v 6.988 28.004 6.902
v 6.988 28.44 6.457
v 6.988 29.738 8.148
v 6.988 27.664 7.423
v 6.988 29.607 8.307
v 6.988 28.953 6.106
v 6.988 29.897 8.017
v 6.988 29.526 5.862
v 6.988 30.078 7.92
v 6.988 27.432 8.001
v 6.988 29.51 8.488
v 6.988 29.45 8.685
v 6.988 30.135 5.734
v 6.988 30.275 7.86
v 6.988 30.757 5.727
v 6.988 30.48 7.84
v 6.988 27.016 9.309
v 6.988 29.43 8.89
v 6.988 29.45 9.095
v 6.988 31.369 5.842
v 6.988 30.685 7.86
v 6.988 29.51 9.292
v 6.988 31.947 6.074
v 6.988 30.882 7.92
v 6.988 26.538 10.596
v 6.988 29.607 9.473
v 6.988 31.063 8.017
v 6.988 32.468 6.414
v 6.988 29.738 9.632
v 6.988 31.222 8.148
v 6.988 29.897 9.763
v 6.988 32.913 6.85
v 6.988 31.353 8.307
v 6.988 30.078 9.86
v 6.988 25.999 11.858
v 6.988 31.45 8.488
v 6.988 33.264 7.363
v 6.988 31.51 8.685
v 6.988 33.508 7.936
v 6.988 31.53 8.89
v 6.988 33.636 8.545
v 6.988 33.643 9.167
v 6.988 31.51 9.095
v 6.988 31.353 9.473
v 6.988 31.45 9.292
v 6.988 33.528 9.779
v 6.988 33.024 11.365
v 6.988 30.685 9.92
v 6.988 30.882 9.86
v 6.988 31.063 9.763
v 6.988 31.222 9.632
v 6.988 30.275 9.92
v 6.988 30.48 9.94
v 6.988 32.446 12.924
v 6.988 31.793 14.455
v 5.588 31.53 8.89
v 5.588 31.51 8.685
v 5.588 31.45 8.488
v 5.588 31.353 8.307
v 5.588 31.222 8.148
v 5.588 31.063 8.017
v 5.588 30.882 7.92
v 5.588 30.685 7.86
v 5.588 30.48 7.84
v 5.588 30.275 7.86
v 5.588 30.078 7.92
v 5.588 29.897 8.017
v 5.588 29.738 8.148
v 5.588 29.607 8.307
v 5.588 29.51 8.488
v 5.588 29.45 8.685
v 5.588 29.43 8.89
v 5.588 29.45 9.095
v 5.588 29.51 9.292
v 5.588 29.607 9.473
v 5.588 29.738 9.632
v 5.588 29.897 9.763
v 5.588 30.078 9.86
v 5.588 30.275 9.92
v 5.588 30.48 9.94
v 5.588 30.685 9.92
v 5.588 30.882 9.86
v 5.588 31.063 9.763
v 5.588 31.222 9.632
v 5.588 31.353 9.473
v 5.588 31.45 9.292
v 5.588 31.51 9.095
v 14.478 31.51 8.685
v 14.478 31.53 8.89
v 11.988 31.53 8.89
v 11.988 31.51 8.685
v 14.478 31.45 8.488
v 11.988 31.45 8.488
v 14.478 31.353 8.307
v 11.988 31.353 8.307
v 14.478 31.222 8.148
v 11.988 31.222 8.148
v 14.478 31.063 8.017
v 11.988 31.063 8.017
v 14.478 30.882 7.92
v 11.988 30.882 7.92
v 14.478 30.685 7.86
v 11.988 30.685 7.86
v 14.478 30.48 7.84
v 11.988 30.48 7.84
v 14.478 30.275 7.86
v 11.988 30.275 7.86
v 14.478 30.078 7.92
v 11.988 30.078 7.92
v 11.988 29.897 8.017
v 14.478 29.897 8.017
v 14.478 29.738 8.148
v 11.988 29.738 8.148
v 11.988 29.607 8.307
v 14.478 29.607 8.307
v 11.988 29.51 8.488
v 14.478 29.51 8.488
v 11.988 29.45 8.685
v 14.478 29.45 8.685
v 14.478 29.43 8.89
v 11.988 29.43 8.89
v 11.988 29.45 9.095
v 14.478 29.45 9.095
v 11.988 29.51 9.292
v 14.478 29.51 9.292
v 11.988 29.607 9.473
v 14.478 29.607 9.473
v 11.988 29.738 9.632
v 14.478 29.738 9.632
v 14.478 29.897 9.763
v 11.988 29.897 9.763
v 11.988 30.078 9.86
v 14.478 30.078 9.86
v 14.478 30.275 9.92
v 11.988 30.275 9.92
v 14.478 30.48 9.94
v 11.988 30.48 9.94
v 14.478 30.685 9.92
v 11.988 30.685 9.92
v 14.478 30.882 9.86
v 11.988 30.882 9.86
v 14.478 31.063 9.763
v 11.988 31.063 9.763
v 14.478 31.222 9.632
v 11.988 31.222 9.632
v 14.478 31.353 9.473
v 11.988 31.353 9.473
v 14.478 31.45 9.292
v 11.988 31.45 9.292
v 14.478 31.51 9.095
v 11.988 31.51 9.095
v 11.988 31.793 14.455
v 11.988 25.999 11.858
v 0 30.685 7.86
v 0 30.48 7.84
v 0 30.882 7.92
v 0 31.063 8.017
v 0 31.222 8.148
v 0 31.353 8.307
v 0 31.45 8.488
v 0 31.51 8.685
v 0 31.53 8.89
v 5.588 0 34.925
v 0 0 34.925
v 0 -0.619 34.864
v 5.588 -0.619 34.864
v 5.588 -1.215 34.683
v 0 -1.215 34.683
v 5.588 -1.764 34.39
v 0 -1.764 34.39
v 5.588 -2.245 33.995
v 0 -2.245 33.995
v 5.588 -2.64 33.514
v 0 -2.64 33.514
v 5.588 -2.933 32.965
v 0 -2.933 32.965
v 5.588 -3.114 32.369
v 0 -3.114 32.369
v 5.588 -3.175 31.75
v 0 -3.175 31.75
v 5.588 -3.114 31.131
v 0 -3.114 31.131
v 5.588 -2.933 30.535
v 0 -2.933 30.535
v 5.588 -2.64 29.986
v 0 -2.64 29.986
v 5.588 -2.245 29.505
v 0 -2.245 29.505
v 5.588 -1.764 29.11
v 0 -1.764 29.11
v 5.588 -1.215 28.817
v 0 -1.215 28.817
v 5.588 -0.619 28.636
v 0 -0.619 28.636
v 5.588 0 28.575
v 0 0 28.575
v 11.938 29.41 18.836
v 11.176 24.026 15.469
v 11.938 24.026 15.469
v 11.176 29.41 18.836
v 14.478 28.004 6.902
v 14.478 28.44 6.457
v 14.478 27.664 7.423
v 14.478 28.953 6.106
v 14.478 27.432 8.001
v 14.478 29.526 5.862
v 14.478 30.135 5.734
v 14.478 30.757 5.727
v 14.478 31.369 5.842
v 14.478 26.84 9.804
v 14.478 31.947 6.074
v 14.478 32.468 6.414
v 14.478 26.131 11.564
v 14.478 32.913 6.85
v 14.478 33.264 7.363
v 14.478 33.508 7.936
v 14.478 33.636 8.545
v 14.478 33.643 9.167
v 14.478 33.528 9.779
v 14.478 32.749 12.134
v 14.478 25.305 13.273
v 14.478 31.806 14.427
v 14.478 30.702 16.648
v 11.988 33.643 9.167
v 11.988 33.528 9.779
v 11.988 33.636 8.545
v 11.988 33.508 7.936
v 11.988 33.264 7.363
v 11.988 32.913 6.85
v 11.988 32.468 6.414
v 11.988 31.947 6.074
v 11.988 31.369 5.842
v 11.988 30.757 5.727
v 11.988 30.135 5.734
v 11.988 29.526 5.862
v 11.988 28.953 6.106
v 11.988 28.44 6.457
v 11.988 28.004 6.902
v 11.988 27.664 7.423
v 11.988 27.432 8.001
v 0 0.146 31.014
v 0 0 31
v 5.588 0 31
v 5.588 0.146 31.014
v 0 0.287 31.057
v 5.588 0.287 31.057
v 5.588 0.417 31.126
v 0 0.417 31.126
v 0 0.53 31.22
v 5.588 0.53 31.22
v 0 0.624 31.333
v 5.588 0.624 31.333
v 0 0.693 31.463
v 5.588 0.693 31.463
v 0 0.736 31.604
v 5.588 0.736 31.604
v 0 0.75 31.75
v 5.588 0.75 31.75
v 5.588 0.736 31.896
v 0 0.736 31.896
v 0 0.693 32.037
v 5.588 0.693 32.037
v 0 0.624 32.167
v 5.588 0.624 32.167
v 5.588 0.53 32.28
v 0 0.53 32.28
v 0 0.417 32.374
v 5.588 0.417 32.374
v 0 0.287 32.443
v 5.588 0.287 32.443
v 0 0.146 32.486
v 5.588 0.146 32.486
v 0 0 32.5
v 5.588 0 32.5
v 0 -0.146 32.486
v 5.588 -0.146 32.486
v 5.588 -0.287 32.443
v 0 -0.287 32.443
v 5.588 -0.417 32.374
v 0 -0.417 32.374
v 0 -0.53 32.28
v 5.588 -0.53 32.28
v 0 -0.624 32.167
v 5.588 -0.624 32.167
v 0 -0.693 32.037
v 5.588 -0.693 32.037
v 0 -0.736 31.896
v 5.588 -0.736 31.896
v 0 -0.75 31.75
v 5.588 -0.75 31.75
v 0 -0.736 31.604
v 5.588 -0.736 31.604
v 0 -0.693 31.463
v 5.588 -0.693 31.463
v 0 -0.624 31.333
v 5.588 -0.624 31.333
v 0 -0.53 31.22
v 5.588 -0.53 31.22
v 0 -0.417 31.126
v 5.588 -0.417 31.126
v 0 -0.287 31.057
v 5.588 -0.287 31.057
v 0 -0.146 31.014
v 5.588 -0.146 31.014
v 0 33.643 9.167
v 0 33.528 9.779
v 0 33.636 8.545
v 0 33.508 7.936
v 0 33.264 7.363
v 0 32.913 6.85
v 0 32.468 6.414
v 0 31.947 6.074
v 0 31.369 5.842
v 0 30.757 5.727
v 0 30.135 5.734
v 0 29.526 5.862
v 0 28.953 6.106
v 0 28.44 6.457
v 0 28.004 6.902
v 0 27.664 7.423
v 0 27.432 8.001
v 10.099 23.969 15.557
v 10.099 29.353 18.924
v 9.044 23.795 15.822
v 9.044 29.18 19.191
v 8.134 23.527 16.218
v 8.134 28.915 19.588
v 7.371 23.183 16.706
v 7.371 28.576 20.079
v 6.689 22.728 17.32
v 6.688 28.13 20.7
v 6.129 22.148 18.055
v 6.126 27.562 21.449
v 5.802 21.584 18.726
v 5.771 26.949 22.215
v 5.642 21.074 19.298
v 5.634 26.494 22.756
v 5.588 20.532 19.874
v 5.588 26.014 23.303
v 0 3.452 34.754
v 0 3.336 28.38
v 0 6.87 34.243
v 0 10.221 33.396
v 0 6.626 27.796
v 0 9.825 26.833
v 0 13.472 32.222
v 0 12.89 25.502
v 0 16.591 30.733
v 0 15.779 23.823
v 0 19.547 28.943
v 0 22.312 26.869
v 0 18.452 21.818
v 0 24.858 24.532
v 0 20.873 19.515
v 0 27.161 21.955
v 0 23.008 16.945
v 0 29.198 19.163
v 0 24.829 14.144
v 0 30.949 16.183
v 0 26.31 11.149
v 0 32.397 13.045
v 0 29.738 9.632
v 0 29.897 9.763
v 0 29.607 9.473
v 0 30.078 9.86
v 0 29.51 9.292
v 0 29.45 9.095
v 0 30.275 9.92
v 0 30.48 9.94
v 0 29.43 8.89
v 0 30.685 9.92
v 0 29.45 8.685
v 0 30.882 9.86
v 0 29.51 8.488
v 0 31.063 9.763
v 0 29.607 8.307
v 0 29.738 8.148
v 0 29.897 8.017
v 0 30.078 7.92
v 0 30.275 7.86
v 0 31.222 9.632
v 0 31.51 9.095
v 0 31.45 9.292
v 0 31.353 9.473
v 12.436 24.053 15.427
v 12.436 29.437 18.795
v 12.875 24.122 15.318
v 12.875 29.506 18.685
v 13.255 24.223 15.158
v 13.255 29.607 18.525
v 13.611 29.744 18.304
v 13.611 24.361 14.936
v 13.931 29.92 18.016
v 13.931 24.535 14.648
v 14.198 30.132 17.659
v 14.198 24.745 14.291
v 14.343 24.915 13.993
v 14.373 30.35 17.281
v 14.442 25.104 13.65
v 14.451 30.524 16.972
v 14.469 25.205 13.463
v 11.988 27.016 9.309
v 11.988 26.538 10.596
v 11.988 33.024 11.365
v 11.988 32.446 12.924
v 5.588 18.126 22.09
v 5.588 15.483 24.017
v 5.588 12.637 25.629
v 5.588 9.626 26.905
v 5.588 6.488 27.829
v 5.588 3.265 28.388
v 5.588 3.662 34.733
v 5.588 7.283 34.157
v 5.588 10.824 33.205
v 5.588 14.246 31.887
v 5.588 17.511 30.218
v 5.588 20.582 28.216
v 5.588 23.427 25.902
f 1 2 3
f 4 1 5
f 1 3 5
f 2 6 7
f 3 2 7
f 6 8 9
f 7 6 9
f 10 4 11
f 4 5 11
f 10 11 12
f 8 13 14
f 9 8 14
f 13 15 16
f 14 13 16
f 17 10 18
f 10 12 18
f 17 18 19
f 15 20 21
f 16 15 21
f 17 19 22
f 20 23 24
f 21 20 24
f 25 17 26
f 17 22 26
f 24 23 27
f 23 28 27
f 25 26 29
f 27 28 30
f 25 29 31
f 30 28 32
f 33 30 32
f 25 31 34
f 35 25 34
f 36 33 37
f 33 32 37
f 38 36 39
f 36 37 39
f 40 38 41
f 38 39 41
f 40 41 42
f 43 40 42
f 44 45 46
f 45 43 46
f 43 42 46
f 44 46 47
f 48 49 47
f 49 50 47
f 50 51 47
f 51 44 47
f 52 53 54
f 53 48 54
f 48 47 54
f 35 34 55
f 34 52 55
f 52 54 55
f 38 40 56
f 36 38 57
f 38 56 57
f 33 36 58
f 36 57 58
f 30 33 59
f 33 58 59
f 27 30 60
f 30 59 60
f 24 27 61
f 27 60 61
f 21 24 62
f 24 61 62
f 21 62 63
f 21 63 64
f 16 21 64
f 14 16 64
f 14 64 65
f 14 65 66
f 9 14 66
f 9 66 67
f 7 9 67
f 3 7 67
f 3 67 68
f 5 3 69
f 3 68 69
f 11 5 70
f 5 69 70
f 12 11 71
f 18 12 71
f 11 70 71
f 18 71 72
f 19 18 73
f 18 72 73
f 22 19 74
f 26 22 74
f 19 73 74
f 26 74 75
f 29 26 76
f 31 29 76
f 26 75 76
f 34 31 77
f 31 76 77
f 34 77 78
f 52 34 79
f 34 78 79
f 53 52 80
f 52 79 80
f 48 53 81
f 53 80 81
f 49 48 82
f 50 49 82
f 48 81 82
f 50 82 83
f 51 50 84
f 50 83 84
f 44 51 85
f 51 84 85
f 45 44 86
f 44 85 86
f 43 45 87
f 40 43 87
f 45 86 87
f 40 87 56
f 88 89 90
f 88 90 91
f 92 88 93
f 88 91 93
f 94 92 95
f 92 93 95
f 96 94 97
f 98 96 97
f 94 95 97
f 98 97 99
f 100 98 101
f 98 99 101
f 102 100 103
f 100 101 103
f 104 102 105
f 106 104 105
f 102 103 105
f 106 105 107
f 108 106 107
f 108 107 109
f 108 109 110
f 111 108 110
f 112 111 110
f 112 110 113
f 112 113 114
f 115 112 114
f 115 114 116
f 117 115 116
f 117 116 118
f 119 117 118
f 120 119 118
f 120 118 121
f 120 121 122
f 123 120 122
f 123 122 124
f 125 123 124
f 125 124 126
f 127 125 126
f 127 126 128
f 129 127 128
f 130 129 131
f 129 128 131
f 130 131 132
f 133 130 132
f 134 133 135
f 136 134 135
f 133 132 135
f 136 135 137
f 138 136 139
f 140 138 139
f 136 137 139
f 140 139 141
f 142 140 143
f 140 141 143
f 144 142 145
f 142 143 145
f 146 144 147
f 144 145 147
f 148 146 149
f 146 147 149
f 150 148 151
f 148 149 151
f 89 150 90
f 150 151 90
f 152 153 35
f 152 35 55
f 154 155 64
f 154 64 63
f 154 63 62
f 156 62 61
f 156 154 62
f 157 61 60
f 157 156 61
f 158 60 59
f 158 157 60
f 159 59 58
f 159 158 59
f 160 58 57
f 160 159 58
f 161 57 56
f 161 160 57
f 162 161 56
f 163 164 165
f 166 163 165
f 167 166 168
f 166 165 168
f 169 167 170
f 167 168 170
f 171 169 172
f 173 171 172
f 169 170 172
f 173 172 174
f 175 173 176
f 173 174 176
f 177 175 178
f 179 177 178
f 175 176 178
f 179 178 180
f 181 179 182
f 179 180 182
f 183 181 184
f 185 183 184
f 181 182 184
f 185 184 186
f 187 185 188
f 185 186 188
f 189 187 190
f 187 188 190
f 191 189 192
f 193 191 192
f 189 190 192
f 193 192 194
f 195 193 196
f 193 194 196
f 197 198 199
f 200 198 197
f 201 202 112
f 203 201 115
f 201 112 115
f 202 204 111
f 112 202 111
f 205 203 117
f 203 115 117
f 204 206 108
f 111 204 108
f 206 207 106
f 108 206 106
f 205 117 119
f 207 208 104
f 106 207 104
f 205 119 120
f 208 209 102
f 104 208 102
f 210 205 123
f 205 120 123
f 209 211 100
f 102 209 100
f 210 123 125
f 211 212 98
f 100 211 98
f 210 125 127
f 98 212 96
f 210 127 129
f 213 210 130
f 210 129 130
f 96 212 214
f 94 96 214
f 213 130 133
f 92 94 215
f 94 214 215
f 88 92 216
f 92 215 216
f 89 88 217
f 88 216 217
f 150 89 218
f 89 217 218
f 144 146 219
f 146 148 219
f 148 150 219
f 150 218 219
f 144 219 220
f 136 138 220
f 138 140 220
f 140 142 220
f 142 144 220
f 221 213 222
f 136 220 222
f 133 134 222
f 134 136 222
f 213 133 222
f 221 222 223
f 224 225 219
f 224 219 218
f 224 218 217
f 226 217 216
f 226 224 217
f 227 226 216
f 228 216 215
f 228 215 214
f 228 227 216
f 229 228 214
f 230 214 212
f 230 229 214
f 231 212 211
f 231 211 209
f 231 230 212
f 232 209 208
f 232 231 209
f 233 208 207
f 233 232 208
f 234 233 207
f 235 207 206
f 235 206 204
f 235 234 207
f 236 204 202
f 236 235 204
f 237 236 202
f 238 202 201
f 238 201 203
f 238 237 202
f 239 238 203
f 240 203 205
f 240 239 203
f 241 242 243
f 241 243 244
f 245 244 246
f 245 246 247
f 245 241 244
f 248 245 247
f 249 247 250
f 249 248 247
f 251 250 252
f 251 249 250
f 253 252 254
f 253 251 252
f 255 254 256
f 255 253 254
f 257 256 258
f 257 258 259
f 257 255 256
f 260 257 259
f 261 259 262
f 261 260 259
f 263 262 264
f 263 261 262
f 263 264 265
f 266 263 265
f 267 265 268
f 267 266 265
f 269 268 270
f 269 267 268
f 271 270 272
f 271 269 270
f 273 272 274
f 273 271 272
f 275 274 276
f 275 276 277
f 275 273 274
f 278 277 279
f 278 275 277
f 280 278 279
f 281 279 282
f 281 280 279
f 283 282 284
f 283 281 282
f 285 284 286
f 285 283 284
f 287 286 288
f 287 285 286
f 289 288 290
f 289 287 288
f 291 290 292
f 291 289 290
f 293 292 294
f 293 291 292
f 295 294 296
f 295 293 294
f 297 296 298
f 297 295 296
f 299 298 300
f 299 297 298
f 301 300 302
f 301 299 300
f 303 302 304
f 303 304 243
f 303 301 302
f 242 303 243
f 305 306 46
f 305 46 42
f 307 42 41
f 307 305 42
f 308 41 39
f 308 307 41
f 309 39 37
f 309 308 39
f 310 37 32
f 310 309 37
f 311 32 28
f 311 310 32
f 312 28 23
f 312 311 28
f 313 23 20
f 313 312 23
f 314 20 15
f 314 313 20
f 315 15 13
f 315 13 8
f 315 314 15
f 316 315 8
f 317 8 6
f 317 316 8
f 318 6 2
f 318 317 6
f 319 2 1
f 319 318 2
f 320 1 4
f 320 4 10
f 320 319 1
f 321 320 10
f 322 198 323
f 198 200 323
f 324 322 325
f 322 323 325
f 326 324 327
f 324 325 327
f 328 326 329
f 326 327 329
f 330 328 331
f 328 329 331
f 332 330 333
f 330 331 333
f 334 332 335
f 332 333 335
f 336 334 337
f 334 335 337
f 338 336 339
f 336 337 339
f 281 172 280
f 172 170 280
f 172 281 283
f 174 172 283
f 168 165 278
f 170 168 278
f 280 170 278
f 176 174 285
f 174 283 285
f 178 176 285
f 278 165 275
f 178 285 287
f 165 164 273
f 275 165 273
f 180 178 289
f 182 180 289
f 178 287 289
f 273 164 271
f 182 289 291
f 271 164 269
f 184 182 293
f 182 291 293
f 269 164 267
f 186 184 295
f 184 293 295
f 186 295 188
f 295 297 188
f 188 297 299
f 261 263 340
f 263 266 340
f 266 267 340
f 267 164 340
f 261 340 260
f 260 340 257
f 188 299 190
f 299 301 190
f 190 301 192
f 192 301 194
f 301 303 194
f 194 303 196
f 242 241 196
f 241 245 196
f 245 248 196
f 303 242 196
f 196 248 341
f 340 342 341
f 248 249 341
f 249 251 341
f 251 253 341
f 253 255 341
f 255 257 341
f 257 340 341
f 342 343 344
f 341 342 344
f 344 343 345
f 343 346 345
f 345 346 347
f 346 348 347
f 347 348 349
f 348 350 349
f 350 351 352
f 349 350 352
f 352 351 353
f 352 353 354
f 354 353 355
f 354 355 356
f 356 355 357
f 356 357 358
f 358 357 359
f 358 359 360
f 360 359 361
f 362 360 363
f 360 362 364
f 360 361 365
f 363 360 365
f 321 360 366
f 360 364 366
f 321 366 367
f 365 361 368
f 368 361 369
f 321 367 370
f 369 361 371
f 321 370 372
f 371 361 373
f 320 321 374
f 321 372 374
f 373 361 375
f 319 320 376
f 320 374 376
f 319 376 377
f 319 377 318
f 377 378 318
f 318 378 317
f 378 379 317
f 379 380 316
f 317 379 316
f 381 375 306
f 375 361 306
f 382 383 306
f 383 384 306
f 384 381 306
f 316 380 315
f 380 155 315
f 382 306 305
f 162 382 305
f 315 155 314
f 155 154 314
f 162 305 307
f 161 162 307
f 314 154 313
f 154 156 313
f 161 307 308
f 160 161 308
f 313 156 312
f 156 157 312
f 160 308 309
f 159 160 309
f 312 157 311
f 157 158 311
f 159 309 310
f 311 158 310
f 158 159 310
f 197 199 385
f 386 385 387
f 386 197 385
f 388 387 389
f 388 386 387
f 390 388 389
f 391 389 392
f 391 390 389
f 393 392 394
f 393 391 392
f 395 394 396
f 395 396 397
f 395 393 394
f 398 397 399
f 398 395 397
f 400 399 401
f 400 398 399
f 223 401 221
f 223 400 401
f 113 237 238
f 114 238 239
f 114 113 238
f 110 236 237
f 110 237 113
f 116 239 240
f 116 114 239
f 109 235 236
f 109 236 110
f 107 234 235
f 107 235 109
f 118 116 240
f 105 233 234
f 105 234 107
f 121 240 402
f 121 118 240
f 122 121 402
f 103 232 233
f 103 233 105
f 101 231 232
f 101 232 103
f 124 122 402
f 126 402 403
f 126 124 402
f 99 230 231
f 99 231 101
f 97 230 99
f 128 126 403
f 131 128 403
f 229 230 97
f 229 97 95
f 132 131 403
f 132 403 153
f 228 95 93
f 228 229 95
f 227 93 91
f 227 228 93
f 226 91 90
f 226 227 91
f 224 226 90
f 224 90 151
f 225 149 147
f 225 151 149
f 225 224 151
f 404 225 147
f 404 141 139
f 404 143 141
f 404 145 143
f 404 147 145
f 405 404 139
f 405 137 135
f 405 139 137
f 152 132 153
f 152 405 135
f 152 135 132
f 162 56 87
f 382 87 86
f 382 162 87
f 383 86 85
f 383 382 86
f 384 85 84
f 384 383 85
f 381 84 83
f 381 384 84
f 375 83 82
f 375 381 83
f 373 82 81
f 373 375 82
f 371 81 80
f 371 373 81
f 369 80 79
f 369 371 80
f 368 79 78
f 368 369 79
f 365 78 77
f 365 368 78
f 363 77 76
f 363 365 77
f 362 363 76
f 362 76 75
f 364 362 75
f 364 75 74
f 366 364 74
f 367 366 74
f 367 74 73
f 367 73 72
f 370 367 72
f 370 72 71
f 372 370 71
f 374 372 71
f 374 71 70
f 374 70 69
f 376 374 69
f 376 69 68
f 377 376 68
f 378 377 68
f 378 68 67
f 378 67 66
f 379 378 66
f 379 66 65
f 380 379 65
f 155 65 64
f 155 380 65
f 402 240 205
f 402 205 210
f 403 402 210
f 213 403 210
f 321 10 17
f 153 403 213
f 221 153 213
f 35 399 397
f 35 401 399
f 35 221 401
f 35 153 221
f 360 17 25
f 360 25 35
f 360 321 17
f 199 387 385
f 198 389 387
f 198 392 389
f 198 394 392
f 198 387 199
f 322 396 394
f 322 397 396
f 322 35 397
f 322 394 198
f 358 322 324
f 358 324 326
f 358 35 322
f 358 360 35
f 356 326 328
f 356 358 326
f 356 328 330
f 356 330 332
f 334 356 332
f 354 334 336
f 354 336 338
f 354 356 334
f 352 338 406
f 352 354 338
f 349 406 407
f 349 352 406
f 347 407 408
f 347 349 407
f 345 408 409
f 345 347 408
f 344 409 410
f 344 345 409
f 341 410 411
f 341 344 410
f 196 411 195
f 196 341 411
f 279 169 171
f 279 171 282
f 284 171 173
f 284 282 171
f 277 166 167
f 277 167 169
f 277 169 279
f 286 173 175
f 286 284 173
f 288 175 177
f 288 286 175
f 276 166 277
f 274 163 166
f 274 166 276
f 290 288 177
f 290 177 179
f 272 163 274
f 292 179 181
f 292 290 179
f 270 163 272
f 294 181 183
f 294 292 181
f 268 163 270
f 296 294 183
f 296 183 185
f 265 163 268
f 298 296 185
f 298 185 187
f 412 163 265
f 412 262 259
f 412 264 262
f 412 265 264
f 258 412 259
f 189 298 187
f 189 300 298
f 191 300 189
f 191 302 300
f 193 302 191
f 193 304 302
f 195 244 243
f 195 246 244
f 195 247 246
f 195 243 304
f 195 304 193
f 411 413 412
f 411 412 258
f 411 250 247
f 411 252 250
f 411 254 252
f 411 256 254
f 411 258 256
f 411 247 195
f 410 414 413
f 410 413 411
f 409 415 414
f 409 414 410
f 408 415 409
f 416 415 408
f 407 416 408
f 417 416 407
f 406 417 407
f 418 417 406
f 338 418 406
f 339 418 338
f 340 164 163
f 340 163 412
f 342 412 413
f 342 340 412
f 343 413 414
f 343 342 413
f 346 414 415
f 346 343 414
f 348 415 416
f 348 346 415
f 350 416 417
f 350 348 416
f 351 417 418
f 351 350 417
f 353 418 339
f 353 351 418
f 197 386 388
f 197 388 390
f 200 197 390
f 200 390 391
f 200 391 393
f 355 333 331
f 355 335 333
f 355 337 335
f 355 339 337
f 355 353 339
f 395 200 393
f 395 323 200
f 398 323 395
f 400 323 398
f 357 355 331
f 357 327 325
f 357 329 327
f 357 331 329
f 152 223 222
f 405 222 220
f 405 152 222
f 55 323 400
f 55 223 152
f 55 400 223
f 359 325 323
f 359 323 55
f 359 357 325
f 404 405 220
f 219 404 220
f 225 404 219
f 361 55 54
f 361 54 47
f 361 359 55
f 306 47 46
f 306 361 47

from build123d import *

# Parameters (mm, degrees)
ESQUISSE1_R             = 0.750000000000002
ESQUISSE1_R_2           = 1.05
BOSS_EXTRU_1_DEPTH      = 5.588
BOSS_EXTRU_2_DEPTH      = 8.889999999999999
ENL_V_MAT_EXTRU_1_DEPTH = 2.5
ESQUISSE4_R             = 1.05
ENL_V_MAT_EXTRU_2_DEPTH = 51.616470975365324
CONG_1_R                = 5.588
CONG_2_R                = 2.54


with BuildPart() as part:
    # Esquisse1 → Boss.-Extru.1 (new body)
    with BuildSketch(Plane(origin=(0, 0, 0), x_dir=(0, 0, -1), z_dir=(1, 0, 0))):
        with BuildLine():
            ThreePointArc((-28.574999999999996, 0), (-22.86, 17.144999999999996), (-8.00099999999999, 27.432000000000002))
            ThreePointArc((-8.00099999999999, 27.432000000000002), (-5.841999999999989, 31.369000000000003), (-9.778999999999986, 33.528))
            ThreePointArc((-9.778999999999986, 33.528), (-27.939999999999998, 20.955), (-34.925, 0))
            ThreePointArc((-34.925, 0), (-31.75, -3.174999999999997), (-28.574999999999996, 0))
        make_face()
        with Locations((-31.75, 0)):
            Circle(ESQUISSE1_R, mode=Mode.SUBTRACT)
        with Locations((-8.889999999999992, 30.480000000000004)):
            Circle(ESQUISSE1_R_2, mode=Mode.SUBTRACT)
    extrude(amount=BOSS_EXTRU_1_DEPTH)

    # Esquisse2 → Boss.-Extru.2 (add)
    with BuildSketch(Plane(origin=(5.588, 0, 0), x_dir=(0, 0, -1), z_dir=(1, 0, 0))):
        with BuildLine():
            Line((-15.468698222001095, 24.026027560057866), (-18.836262664685126, 29.410046477810756))
            ThreePointArc((-18.836262664685126, 29.410046477810756), (-14.455023336022604, 31.793205647670106), (-9.778999999999986, 33.528000000000006))
            ThreePointArc((-9.778999999999986, 33.528000000000006), (-5.8419999999999845, 31.369000000000003), (-8.000999999999987, 27.432))
            ThreePointArc((-8.000999999999987, 27.432), (-11.85777574941277, 25.9985341755384), (-15.468698222001095, 24.026027560057866))
        make_face()
    extrude(amount=BOSS_EXTRU_2_DEPTH)

    # Esquisse3 → Enlèv. mat.-Extru.1 (cut, symmetric)
    with BuildSketch(Plane(origin=(9.487780000000024, 4.74e-15, -3.69e-15), x_dir=(-1.3e-16, 0, -1), z_dir=(1, 2.5e-16, -1.3e-16))):
        with BuildLine():
            Line((-11.857775749412772, 25.9985341755384), (-14.455023336022602, 31.793205647670096))
            ThreePointArc((-14.455023336022602, 31.793205647670096), (-12.148018341439107, 32.74417925946624), (-9.778999999999993, 33.528))
            ThreePointArc((-9.778999999999993, 33.528), (-5.84199999999999, 31.368999999999996), (-8.000999999999994, 27.43199999999999))
            ThreePointArc((-8.000999999999994, 27.43199999999999), (-9.9552222292544, 26.78477506655896), (-11.857775749412772, 25.9985341755384))
        make_face()
    extrude(amount=ENL_V_MAT_EXTRU_1_DEPTH, both=True, mode=Mode.SUBTRACT)

    # Esquisse4 → Enlèv. mat.-Extru.2 (cut, through all)
    with BuildSketch(Plane.ZY):
        with Locations(Location((8.889999999999992, 30.480000000000004, 0), (0, 0, 90))):
            Circle(ESQUISSE4_R)
    extrude(amount=-ENL_V_MAT_EXTRU_2_DEPTH, mode=Mode.SUBTRACT)

    # Congé1
    cong_1_edges = [part.edges().sort_by_distance(p)[0] for p in [
        (5.588, 26.71803701893431, 17.152480443343112),
    ]]
    fillet(cong_1_edges, radius=CONG_1_R)

    # Congé2
    cong_2_edges = [part.edges().sort_by_distance(p)[0] for p in [
        (14.477999999999998, 26.71803701893431, 17.152480443343112),
    ]]
    fillet(cong_2_edges, radius=CONG_2_R)


solid = part.part
